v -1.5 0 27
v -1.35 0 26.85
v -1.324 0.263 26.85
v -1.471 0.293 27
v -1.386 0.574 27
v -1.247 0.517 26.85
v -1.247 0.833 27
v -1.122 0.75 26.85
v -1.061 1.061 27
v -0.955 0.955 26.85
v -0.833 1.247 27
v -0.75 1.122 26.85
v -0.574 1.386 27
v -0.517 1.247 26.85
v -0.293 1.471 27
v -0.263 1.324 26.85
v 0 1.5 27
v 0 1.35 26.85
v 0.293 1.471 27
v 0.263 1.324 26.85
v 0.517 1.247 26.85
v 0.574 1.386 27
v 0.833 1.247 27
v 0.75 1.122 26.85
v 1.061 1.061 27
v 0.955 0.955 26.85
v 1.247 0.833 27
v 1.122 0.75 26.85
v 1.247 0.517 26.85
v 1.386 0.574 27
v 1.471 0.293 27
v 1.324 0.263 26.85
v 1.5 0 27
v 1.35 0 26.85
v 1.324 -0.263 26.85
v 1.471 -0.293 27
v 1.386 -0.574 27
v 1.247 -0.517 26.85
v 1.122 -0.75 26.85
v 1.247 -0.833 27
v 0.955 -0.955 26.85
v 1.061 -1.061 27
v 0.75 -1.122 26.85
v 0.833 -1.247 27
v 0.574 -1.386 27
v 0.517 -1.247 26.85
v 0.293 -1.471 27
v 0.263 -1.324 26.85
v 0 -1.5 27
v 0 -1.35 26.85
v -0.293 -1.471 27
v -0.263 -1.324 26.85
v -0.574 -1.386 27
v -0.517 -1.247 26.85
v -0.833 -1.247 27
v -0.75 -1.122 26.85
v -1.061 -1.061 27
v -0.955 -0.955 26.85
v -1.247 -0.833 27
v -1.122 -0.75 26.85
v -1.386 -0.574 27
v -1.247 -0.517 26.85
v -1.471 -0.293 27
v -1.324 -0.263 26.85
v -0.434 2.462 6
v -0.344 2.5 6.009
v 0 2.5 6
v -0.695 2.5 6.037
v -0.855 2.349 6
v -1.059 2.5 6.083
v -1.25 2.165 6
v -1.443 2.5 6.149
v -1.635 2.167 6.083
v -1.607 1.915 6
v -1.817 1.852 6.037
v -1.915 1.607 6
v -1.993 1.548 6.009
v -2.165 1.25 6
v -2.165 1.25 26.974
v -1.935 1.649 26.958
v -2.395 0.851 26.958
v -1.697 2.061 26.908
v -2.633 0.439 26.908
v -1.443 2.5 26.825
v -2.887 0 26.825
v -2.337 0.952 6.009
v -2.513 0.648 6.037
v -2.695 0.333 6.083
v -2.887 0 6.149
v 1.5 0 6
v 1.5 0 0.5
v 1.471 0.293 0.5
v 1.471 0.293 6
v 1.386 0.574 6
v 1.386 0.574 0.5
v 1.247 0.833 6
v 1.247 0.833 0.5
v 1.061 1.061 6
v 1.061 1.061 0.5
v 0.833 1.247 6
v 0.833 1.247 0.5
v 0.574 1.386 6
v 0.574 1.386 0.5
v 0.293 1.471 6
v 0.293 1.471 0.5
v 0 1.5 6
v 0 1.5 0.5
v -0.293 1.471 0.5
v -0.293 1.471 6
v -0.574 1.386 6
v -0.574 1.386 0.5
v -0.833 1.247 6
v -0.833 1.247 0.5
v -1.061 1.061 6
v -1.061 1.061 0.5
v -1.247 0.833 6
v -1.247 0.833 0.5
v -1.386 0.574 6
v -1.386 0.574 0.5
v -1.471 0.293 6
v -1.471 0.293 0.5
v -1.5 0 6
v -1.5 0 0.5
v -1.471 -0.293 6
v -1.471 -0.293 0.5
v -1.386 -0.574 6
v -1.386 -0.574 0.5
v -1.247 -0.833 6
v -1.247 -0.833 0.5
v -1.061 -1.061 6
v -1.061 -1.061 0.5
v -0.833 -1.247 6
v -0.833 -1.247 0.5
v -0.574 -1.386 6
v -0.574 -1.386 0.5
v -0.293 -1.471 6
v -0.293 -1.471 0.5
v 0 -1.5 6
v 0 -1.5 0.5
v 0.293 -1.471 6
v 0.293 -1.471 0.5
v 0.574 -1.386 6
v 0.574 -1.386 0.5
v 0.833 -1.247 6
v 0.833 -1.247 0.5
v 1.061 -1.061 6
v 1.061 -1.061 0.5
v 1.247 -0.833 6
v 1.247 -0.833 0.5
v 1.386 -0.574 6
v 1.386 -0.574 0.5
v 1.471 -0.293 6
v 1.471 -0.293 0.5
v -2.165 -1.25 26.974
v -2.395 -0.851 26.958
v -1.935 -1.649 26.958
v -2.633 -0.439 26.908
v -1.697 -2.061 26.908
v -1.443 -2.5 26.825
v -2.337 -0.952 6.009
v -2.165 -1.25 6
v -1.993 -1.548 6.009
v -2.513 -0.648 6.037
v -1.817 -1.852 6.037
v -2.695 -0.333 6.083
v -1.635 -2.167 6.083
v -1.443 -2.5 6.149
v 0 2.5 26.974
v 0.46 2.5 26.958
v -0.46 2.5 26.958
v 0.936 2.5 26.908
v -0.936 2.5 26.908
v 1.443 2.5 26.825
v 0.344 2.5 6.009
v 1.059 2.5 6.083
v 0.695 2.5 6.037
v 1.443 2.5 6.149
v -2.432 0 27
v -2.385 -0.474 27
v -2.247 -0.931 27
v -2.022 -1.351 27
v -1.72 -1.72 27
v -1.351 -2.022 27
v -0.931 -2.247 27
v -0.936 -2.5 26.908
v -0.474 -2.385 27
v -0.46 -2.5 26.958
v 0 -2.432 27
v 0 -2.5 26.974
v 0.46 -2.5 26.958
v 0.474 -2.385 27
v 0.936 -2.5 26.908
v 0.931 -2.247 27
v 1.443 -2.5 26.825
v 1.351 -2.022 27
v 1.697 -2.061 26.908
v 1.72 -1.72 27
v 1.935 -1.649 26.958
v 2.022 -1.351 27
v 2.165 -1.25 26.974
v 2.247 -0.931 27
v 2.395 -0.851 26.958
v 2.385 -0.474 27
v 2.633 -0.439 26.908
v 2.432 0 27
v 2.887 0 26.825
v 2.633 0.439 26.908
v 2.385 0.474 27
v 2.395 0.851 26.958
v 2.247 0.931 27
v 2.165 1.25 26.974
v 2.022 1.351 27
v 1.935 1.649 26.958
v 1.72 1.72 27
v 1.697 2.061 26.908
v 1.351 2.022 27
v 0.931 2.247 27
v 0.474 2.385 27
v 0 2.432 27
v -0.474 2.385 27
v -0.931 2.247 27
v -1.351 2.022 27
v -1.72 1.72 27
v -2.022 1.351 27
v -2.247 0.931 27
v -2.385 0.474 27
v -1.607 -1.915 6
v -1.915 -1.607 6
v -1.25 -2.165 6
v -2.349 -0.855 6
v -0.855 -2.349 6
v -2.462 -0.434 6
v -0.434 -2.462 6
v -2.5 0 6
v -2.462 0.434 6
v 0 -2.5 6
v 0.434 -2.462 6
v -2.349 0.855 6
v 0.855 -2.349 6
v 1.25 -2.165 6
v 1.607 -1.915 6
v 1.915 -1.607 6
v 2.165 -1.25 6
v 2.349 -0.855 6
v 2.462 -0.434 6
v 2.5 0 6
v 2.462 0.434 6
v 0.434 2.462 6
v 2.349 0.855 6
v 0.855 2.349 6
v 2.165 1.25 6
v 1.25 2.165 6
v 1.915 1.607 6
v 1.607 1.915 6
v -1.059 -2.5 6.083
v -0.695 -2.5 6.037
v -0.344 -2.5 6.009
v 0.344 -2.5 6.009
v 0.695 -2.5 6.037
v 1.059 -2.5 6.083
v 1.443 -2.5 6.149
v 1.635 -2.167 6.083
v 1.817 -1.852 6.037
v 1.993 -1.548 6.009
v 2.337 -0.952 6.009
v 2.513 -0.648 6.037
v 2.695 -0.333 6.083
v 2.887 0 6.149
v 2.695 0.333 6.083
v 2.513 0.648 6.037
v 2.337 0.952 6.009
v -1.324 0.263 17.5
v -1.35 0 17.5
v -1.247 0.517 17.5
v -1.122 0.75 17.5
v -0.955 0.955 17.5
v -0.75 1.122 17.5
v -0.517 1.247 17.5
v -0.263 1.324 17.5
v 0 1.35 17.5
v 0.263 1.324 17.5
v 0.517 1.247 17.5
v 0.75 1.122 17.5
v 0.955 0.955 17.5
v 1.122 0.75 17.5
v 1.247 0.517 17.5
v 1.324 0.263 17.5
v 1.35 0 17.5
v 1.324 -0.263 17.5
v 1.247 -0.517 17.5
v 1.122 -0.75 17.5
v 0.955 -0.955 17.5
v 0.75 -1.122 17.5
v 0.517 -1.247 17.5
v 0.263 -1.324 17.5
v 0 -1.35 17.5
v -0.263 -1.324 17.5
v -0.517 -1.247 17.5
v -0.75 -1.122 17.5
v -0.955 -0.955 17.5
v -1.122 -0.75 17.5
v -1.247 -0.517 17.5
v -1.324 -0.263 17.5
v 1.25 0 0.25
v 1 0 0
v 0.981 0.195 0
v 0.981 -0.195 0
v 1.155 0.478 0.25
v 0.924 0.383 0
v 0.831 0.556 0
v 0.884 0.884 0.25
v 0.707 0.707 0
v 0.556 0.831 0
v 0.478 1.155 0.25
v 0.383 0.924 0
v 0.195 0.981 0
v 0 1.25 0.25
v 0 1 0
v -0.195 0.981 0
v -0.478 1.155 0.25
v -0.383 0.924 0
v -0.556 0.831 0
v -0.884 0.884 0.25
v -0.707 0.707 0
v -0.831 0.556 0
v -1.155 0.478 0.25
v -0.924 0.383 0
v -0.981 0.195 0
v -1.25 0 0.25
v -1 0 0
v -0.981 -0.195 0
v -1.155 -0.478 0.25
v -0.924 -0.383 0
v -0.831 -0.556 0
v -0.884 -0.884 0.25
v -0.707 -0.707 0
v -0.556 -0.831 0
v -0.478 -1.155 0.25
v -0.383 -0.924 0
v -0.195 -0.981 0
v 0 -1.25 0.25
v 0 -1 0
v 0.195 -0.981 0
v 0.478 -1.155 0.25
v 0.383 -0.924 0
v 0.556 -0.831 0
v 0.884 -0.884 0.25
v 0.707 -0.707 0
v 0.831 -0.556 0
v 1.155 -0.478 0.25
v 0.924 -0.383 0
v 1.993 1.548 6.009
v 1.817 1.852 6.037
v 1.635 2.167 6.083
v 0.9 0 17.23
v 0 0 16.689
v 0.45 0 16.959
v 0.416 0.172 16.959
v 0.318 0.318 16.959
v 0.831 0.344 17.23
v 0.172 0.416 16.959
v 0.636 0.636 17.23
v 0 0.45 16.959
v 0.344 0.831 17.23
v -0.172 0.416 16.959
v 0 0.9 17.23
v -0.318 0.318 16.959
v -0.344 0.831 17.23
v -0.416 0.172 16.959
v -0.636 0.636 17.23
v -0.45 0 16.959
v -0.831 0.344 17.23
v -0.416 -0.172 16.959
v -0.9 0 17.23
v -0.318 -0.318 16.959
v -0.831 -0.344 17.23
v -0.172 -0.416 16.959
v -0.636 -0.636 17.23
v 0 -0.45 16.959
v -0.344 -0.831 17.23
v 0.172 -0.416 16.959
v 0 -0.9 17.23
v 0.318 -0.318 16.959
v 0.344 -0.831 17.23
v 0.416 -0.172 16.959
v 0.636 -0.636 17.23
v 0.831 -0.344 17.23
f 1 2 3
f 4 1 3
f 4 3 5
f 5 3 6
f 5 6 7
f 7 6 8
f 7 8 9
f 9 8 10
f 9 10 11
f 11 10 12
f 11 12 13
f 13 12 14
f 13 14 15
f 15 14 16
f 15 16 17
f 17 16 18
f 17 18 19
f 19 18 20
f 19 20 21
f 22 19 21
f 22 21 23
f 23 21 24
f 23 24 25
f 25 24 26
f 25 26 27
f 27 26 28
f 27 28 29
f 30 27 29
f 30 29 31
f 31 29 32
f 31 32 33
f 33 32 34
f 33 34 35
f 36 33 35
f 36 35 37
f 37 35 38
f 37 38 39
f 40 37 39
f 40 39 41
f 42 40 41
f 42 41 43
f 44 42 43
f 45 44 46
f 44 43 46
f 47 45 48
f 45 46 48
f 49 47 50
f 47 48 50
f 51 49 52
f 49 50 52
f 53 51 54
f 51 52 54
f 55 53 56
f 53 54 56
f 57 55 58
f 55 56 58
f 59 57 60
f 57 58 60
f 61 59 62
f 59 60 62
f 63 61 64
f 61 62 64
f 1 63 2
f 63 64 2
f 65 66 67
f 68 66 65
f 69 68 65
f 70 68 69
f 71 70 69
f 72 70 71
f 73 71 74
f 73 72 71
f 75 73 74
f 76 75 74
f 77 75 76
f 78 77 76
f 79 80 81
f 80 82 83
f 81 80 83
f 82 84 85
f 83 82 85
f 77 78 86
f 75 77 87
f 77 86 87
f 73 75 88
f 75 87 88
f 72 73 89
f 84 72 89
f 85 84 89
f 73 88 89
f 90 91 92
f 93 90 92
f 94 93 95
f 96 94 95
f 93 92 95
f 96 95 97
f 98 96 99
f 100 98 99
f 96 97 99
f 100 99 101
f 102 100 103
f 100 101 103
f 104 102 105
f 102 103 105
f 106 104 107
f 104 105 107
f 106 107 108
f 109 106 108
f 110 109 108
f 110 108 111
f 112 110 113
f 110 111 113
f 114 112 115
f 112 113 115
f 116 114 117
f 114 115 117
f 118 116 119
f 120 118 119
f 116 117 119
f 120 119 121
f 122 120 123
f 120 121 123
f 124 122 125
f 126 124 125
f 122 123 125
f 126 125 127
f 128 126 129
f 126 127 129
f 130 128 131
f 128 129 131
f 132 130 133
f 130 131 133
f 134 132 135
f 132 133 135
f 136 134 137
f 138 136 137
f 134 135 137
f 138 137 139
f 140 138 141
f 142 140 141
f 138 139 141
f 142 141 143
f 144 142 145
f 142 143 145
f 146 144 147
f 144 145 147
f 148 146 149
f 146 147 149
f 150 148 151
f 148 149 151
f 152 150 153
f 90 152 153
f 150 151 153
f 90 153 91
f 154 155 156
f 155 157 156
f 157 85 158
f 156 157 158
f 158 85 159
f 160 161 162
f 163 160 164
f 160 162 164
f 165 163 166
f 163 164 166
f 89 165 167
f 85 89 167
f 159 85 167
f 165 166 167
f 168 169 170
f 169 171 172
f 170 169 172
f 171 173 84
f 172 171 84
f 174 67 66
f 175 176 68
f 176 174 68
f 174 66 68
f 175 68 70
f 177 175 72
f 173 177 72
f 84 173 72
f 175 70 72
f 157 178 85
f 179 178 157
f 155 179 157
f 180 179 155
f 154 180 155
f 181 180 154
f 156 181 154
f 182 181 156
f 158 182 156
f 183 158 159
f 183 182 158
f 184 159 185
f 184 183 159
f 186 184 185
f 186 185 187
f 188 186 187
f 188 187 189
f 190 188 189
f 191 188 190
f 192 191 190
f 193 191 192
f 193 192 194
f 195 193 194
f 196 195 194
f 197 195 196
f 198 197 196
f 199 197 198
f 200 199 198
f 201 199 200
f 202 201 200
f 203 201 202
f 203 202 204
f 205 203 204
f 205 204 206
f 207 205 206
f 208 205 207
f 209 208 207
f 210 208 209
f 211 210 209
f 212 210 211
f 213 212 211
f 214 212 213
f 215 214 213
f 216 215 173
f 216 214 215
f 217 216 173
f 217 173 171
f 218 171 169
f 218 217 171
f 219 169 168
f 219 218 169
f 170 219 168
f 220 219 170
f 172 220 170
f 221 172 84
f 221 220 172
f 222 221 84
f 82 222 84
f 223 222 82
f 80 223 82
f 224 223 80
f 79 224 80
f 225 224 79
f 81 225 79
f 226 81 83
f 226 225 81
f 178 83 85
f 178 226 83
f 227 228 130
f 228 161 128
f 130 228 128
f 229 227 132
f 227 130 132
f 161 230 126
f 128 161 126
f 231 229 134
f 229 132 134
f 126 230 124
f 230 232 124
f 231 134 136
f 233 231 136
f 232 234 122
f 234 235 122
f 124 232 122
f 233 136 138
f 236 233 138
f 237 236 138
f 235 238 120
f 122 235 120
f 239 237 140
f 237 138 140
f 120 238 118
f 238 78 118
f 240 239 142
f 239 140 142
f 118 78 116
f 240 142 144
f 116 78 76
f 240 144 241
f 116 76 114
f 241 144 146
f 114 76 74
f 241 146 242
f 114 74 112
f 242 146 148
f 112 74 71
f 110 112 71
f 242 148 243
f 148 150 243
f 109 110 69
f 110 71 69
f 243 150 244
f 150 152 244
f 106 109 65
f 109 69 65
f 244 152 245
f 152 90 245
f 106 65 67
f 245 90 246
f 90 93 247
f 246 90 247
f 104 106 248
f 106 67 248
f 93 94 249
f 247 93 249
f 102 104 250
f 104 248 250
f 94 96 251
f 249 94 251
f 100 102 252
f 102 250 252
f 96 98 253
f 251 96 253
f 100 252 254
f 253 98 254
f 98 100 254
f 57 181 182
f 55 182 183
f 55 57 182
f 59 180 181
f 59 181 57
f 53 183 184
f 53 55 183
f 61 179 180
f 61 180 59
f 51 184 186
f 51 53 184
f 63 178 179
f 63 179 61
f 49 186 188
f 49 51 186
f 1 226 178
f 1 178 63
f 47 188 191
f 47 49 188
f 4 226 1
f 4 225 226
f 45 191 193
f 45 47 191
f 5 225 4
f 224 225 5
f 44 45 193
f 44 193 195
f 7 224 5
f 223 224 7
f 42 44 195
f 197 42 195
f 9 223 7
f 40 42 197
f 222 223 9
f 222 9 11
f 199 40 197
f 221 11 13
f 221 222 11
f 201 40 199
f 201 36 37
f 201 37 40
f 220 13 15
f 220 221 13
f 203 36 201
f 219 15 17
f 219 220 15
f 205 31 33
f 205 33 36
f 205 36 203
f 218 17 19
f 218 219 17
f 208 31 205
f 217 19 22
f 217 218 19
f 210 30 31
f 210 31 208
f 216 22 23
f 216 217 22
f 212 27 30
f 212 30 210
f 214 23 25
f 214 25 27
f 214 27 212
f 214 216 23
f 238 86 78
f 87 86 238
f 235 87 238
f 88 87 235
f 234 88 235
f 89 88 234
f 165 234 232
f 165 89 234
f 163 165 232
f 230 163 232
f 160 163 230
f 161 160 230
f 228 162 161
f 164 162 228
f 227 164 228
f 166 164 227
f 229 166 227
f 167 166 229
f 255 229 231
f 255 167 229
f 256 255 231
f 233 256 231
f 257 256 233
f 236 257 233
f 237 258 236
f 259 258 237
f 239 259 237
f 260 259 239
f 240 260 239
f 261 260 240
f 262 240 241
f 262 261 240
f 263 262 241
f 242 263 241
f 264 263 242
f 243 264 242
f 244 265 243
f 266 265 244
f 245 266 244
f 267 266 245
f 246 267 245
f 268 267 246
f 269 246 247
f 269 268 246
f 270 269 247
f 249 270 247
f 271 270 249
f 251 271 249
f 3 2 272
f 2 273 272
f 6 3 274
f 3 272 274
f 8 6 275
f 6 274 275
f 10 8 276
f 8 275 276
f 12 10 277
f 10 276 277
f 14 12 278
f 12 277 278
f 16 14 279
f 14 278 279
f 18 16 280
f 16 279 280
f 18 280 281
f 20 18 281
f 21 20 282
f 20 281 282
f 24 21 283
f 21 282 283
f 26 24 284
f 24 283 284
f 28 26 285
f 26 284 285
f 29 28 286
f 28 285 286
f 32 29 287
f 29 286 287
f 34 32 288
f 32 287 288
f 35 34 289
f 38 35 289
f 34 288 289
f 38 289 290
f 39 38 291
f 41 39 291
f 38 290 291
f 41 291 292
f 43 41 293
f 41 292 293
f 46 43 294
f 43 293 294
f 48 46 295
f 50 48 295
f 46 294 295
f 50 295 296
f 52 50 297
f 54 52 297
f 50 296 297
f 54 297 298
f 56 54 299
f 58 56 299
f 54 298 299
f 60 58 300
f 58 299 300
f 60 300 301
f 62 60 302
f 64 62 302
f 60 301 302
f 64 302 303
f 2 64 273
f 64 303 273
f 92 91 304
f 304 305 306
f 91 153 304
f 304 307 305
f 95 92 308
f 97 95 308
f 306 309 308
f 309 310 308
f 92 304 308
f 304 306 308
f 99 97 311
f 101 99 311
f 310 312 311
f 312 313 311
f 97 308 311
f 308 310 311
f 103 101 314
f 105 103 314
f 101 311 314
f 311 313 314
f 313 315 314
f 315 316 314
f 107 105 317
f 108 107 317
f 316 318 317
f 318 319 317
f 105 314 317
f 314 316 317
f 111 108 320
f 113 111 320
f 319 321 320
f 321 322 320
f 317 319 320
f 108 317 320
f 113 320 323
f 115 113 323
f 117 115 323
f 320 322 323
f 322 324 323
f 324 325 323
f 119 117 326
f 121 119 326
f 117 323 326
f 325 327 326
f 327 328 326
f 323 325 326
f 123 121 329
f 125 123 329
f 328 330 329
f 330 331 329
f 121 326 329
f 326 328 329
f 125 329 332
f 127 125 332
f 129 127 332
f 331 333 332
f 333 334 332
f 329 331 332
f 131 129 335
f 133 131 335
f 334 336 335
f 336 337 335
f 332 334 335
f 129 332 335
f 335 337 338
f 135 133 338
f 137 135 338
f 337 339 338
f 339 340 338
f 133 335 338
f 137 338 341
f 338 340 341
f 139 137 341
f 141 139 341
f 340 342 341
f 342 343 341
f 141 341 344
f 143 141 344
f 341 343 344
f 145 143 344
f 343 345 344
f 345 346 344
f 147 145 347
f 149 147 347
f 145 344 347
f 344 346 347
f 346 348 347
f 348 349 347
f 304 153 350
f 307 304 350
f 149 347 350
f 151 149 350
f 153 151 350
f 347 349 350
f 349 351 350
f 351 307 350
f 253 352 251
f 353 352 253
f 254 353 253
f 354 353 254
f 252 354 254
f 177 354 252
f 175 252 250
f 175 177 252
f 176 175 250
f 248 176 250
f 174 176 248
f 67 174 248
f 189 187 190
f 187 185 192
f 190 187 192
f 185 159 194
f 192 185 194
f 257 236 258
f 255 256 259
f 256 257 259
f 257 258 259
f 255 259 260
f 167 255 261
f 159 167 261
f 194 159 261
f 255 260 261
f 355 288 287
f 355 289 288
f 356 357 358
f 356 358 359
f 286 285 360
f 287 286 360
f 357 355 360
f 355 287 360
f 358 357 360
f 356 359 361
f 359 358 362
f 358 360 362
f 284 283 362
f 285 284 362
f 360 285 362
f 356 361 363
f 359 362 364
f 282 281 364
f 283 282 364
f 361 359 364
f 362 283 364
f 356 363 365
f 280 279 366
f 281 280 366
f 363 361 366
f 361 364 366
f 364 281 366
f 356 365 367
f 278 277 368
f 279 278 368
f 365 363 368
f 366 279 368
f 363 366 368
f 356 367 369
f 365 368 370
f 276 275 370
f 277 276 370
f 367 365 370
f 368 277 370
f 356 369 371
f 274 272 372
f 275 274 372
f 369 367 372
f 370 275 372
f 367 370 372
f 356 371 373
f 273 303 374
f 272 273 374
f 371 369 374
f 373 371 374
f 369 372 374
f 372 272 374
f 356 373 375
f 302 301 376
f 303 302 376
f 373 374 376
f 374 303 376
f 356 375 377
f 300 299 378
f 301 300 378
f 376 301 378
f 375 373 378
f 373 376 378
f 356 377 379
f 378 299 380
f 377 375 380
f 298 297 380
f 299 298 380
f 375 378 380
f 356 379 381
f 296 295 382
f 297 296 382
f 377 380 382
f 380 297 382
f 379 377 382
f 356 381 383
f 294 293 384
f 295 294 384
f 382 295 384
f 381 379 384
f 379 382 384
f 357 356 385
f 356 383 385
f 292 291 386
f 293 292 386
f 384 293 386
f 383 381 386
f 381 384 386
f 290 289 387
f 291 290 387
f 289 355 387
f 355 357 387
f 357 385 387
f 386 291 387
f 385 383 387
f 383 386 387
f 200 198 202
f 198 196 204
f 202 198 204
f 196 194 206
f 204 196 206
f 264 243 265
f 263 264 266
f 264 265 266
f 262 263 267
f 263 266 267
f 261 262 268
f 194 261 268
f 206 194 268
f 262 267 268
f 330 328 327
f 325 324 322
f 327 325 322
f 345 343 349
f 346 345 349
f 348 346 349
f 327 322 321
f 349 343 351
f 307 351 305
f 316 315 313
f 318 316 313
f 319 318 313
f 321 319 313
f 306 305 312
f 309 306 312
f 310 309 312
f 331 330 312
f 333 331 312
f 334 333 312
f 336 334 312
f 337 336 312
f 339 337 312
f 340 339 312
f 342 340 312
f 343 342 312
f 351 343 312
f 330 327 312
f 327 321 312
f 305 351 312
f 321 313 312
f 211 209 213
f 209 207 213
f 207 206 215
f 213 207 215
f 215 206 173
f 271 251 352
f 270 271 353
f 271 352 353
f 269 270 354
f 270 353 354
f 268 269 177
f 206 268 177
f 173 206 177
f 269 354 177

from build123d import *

# Parameters (mm, degrees)
F0_R           = 1.5
F1_DEPTH       = 6
F3_DEPTH       = 21
F5_D           = 2.7
F5_DEPTH       = 9.5
F5_CSINK_D     = 3
F5_CSINK_ANGLE = 90
F5_TIP         = 0.8111618357
F8_SIZE        = 0.5


with BuildPart() as f1:
    # F0 (on Top) → F1 (new body)
    with BuildSketch(Plane.XY):
        Circle(F0_R)
    extrude(amount=F1_DEPTH)

    # F2 (on face) → F3 (join)
    with BuildSketch(Plane.XY.offset(6)):
        Polygon((-1.443375673, -2.5), (1.443375673, -2.5), (2.8867513459, 0), (1.443375673, 2.5), (-1.443375673, 2.5), (-2.8867513459, 0), align=None)
    extrude(amount=F3_DEPTH)

    # F5
    with Locations(Plane.XY.offset(27)):
        with Locations((0, 0)):
            CounterSinkHole(F5_D / 2, F5_CSINK_D / 2, depth=F5_DEPTH, counter_sink_angle=F5_CSINK_ANGLE)
            with Locations((0, 0, -(F5_DEPTH + F5_TIP / 2))):  # 118° drill point
                Cone(0, F5_D / 2, F5_TIP, mode=Mode.SUBTRACT)

    # F6 (on Front) → F7 (revolve, cut)
    with BuildSketch(Plane.XZ):
        Polygon((-3.6906760422, 6.4588518128), (-3.6906760422, 6), (-2.5, 6), align=None)
        Polygon((-3.6226674233, 26.5411481872), (-2.4319913811, 27), (-3.6226674233, 27), align=None)
    revolve(axis=Axis((0, 0, 14.2609653992), (0, 0, 1)), mode=Mode.SUBTRACT)

    # F8
    f8_edges = [f1.edges().sort_by_distance(p)[0] for p in [
        (-1.5, 0, 0),
    ]]
    chamfer(f8_edges, length=F8_SIZE)


solid = f1.part
